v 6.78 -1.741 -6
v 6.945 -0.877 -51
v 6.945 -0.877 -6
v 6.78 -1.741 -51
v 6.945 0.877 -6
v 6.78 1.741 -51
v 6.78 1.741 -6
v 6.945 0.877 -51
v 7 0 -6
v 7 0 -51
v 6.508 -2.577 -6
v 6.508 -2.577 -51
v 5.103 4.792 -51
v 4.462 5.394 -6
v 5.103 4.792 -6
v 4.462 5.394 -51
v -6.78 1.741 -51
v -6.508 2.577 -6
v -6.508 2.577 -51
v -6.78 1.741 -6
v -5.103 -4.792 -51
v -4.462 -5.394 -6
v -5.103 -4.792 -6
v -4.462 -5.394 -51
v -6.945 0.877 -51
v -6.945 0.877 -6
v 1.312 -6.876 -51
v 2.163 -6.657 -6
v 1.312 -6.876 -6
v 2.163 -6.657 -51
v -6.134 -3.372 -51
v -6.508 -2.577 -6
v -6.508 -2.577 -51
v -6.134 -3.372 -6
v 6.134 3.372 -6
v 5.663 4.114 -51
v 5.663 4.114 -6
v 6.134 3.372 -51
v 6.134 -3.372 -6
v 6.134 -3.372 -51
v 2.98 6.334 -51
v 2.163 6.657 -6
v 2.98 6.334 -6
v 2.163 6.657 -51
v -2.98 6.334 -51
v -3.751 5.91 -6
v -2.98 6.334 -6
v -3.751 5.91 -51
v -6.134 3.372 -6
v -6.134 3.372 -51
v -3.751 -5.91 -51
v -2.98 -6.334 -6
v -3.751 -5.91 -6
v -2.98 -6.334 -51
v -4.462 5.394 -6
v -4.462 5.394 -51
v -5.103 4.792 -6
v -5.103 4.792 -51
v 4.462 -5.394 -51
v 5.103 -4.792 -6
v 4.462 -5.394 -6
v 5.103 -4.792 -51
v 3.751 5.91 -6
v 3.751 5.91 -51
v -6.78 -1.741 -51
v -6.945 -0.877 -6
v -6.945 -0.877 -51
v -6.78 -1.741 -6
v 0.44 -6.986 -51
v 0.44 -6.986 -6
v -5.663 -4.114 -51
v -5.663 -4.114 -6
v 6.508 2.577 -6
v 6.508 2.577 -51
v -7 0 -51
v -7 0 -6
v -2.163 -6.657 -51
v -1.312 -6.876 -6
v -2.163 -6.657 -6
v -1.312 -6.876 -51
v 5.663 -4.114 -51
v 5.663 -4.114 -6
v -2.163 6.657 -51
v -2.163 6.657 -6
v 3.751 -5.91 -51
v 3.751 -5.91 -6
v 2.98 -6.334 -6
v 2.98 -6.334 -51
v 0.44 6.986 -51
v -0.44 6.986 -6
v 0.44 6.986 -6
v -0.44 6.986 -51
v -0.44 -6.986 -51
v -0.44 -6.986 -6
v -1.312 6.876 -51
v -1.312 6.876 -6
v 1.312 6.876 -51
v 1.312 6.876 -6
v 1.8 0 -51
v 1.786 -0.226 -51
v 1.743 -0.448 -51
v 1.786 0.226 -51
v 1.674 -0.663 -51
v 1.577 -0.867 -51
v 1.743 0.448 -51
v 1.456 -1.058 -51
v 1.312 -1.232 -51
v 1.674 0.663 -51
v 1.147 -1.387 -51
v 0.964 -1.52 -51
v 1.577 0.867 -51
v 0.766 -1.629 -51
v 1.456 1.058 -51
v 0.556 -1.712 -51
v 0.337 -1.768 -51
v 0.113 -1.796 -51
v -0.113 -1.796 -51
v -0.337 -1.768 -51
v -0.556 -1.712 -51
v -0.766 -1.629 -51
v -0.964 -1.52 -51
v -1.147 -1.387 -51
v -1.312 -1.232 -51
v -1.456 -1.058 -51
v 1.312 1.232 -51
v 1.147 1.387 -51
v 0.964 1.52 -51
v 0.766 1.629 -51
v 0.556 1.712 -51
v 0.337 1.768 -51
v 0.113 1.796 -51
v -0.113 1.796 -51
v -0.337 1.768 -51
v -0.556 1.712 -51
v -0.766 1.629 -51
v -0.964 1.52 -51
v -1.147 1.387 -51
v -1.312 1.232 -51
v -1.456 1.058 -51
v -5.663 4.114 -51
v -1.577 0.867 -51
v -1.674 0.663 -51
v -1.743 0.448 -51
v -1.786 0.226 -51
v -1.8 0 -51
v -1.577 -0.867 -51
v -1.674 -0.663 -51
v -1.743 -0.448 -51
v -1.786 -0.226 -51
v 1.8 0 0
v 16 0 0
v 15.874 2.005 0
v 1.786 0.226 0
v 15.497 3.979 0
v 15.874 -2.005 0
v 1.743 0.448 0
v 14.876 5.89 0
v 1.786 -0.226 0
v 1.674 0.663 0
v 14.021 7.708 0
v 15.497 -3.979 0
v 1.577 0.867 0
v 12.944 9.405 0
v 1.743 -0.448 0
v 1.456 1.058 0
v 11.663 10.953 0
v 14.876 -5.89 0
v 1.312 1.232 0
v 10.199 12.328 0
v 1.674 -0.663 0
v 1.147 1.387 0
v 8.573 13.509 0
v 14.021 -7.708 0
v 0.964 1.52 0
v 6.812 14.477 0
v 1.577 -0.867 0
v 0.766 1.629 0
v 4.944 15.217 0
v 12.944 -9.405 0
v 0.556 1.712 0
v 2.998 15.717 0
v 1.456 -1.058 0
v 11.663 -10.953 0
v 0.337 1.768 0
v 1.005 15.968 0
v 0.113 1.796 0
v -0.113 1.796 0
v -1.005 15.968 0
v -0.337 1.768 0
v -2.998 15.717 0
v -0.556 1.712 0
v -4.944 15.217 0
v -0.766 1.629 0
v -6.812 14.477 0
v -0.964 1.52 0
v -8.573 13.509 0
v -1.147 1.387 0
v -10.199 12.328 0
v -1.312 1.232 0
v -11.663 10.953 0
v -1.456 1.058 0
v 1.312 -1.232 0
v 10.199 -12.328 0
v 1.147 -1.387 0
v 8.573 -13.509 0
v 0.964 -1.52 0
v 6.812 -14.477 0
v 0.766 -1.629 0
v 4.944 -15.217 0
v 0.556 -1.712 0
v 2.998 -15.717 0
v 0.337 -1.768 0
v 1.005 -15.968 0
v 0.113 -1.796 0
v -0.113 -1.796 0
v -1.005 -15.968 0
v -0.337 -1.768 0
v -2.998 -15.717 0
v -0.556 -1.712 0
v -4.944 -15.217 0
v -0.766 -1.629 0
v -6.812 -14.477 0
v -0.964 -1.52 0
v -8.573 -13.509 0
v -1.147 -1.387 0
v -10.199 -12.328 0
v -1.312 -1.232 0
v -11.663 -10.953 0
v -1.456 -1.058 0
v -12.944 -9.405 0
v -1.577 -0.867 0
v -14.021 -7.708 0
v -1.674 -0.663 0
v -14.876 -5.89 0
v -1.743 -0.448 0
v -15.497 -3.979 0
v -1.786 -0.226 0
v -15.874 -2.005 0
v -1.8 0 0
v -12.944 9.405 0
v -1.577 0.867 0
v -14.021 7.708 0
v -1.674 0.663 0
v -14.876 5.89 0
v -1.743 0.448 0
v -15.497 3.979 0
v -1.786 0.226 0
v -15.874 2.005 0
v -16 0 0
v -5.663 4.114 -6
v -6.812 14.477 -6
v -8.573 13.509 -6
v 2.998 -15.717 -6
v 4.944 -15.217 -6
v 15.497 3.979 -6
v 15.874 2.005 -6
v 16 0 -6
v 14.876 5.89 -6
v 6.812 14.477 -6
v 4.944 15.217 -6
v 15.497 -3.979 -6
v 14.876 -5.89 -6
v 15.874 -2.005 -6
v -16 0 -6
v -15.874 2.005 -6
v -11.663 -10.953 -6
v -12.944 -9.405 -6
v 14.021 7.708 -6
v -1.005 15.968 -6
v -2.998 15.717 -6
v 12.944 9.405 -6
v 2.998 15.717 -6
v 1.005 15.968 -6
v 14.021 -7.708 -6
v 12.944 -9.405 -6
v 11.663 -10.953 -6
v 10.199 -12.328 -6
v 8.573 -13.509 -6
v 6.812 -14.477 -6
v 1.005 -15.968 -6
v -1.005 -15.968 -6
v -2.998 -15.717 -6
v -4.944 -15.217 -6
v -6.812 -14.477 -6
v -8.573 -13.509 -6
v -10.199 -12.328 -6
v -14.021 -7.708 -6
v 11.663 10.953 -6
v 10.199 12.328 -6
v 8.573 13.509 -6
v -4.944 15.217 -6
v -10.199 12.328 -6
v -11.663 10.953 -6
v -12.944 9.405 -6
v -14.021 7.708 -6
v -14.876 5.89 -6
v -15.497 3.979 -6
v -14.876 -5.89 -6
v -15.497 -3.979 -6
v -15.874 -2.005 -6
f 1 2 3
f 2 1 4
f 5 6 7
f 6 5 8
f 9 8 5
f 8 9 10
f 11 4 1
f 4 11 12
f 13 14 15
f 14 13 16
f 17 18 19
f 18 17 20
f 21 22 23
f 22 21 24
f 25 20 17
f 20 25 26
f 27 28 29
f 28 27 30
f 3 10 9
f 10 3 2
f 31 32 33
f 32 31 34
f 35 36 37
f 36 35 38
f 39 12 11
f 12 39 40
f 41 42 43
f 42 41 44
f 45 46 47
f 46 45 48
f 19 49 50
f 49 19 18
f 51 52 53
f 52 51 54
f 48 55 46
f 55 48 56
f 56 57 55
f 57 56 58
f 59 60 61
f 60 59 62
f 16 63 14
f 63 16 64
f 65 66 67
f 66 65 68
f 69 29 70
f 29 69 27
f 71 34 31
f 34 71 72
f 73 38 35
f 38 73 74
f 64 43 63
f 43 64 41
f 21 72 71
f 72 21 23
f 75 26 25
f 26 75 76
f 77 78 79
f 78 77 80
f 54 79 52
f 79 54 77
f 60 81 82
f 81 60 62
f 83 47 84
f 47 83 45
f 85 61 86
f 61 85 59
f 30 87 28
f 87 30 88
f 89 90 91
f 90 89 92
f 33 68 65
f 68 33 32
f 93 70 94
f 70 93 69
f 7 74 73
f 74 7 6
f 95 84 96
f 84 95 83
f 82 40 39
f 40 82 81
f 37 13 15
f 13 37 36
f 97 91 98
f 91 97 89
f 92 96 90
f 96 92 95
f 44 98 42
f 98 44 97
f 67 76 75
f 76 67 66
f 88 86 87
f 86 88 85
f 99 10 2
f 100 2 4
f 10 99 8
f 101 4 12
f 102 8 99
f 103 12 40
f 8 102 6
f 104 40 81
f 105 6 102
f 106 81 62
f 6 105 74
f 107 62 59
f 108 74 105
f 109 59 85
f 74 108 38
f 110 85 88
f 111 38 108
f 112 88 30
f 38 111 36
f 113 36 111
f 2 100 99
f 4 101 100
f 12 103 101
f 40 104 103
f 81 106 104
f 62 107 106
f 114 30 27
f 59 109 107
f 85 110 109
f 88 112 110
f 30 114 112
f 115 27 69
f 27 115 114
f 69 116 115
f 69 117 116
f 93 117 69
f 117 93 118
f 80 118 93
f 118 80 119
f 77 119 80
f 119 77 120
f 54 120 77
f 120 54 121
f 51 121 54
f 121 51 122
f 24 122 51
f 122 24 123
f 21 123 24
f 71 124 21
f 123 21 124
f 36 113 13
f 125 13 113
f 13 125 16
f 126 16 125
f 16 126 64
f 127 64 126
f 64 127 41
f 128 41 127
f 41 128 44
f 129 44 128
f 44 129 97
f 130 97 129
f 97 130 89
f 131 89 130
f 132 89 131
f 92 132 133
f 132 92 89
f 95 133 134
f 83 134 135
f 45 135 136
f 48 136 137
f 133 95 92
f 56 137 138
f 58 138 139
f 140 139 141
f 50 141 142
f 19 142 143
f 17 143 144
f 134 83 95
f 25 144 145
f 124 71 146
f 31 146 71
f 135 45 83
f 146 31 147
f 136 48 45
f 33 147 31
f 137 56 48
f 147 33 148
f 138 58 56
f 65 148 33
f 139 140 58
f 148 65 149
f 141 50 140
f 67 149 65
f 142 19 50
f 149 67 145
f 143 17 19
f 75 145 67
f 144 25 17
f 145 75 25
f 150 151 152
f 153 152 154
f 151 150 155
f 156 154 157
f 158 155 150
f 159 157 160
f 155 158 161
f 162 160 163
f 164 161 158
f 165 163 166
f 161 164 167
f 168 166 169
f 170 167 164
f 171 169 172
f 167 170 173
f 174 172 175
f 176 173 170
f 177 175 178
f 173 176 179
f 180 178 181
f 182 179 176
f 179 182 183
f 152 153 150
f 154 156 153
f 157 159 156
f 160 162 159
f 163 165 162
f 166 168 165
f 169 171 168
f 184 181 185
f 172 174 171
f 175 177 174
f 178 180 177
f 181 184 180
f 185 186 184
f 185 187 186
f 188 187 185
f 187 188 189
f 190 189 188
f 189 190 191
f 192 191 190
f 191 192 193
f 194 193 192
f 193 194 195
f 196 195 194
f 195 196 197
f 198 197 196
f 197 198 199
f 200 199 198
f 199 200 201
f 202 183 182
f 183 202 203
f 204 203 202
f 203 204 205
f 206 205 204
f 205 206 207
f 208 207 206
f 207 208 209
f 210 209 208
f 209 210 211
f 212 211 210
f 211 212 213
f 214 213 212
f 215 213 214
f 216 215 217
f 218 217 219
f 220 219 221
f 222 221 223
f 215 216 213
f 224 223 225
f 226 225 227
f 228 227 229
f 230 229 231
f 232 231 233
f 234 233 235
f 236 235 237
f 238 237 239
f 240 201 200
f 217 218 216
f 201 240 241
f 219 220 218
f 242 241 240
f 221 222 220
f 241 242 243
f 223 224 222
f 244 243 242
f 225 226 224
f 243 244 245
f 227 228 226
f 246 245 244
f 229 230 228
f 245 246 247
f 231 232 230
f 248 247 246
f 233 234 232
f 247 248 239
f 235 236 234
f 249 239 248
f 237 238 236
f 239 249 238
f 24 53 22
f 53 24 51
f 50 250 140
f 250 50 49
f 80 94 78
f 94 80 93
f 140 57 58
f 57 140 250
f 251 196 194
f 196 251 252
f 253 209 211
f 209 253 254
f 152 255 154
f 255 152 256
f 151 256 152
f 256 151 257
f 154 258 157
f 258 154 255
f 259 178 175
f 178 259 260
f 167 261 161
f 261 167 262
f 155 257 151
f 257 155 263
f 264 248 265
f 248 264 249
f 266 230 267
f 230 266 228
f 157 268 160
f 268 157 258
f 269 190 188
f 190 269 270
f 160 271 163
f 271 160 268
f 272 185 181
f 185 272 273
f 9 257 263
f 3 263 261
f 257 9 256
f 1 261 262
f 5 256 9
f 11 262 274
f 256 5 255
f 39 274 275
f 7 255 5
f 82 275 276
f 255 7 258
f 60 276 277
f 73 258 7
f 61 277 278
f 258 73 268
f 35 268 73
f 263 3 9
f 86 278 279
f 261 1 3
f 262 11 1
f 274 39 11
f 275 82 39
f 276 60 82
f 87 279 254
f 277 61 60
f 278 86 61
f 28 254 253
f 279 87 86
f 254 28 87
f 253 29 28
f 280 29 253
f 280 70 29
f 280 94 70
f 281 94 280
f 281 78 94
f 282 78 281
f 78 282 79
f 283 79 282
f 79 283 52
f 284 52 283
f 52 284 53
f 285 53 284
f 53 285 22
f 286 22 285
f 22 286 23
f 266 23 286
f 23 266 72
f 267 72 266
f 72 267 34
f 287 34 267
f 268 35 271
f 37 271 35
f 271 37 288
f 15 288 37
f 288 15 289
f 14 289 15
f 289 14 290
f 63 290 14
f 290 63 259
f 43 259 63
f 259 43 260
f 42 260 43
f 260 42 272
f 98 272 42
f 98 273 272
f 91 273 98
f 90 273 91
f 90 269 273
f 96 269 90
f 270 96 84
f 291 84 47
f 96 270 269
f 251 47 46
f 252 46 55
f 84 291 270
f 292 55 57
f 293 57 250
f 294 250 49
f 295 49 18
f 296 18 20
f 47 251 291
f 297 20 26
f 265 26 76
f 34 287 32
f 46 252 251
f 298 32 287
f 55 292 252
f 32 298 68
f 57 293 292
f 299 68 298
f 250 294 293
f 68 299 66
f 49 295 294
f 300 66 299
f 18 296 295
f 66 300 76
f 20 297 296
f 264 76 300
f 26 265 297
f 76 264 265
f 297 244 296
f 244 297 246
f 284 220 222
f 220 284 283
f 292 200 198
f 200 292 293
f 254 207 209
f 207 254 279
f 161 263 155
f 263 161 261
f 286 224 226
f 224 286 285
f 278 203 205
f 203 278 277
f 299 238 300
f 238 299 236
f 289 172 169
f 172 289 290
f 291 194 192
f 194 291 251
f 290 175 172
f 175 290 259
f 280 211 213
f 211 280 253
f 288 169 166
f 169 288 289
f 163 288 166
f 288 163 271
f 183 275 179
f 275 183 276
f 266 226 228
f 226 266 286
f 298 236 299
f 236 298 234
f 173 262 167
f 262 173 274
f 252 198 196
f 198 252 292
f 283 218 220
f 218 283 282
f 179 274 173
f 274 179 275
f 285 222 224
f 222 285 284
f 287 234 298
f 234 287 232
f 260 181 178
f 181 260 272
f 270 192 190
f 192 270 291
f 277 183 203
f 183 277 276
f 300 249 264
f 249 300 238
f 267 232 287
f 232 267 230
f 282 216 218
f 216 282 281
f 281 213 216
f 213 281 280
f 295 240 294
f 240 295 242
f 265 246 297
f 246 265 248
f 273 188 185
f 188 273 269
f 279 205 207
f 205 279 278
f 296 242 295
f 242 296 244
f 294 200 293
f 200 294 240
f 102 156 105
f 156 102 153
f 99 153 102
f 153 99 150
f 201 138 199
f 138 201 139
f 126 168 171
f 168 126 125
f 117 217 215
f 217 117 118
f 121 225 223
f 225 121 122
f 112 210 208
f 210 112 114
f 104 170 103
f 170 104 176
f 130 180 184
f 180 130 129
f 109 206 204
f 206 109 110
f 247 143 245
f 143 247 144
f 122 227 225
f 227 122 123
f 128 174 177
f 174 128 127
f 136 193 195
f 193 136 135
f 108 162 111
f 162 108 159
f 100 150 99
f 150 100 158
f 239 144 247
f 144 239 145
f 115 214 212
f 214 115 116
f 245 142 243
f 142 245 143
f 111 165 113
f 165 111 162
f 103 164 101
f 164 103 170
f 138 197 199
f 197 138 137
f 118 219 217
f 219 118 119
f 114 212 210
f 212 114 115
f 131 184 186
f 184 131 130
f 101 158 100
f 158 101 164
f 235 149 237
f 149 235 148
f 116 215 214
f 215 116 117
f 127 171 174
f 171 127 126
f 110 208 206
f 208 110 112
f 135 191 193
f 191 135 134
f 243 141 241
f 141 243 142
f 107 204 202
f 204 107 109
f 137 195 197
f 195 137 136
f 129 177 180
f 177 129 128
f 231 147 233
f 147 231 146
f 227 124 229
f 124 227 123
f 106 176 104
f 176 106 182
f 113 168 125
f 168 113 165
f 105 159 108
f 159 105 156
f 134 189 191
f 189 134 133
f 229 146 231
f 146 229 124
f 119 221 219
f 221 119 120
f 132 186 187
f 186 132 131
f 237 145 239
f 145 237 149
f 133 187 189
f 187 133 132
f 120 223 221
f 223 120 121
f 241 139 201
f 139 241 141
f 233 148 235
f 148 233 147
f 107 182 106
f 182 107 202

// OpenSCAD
$fn = 50;


difference() {
	union() {
		translate(v = [0, 0, -51.0000000000]) {
			cylinder(h = 51, r = 7.0000000000);
		}
		translate(v = [0, 0, -6.0000000000]) {
			cylinder(h = 6, r = 16.0000000000);
		}
	}
	union() {
		#translate(v = [0, 0, -51]) {
			cylinder(h = 51, r = 1.8000000000);
		}
	}
}
